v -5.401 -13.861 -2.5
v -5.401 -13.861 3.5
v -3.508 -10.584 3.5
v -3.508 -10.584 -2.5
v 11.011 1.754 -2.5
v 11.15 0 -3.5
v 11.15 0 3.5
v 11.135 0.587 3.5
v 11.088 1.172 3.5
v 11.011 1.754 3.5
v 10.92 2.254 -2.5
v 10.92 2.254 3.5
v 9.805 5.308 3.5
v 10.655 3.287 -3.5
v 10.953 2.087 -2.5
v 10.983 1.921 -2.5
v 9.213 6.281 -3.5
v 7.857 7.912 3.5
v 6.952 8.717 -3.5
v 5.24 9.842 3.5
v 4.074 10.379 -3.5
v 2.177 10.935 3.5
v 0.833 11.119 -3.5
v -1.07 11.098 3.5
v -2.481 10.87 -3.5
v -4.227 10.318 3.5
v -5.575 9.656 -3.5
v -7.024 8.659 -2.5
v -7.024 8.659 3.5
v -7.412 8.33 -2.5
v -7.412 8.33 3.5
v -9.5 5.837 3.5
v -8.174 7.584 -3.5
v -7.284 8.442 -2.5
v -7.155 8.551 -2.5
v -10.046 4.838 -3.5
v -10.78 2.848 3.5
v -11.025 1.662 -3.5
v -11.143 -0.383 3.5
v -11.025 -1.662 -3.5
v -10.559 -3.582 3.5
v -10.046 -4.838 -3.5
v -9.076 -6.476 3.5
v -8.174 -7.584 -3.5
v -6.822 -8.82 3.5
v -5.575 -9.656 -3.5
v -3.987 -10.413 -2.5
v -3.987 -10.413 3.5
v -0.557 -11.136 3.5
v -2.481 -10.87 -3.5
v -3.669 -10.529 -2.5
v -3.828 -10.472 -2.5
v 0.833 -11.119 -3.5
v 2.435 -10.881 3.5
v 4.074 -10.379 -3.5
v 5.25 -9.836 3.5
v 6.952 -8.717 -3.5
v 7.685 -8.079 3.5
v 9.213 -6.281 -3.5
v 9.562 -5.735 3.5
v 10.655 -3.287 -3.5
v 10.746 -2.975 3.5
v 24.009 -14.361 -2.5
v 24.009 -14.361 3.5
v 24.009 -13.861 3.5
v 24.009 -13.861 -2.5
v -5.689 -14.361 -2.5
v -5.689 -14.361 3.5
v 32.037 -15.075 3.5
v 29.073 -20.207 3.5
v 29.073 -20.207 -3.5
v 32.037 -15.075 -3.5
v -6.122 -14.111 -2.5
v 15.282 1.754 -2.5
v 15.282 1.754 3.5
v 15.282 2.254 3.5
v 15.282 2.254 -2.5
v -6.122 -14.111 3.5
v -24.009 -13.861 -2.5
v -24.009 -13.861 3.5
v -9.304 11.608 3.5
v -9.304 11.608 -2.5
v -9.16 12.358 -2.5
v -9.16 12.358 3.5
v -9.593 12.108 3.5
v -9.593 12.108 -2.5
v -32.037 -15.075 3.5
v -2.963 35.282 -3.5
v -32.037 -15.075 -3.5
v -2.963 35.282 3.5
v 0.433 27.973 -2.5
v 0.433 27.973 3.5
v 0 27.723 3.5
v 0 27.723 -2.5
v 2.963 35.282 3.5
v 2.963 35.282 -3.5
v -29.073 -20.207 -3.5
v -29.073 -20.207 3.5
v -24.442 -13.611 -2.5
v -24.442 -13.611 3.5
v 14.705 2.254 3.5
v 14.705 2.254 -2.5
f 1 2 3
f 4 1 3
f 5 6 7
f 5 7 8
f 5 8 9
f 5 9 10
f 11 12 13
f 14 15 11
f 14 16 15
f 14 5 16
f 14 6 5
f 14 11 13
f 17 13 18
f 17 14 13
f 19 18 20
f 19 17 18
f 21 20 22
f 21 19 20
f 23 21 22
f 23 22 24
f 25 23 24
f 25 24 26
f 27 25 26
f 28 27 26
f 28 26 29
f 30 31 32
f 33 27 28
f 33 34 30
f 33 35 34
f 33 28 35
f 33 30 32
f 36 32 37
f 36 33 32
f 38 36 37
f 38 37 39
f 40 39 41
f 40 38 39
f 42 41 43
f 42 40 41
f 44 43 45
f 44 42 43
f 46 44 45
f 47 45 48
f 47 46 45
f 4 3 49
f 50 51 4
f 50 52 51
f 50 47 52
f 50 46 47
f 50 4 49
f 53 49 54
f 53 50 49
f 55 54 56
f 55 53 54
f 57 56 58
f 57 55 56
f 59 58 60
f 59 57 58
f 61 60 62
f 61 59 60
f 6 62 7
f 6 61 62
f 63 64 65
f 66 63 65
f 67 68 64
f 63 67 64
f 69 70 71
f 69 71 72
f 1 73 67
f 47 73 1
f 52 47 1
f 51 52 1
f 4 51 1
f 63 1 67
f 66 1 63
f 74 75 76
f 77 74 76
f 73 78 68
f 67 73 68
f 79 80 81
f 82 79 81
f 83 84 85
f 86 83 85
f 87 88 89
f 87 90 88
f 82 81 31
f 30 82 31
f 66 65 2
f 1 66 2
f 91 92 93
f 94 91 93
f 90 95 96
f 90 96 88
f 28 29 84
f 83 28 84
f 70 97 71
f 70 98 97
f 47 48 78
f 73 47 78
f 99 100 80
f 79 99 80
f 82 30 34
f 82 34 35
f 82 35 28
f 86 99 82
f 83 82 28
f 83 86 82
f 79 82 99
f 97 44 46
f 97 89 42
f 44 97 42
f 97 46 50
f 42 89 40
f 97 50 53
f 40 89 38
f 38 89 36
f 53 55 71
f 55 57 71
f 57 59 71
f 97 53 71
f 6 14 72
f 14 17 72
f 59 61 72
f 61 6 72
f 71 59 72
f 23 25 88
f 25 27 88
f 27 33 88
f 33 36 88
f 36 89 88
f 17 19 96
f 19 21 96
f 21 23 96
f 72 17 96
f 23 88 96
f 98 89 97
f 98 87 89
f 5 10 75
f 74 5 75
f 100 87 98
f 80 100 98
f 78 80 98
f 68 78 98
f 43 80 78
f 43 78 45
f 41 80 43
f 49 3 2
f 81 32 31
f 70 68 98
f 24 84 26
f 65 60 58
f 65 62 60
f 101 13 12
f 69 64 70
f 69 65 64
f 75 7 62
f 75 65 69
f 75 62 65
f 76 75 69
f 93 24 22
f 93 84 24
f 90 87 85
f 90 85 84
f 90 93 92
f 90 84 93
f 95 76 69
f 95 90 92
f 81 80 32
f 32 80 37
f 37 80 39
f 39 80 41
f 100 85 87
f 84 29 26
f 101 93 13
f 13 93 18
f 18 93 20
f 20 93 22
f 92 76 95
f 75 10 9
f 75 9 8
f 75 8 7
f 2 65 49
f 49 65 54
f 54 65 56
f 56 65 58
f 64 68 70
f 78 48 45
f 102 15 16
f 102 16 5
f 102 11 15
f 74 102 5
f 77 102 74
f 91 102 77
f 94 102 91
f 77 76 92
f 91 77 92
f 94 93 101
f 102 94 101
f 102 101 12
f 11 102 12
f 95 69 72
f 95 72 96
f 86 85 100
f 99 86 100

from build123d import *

# Parameters (mm, degrees)
F0_R     = 11.15
F1_DEPTH = 3.5
F3_DEPTH = 6


with BuildPart() as f1:
    # F0 (on Top) → F1 (new body, symmetric)
    with BuildSketch(Plane.XY):
        Polygon((-29.073366, -20.207259), (29.073366, -20.207259), (32.036683, -15.074644), (2.963317, 35.281903), (-2.963317, 35.281903), (-32.036683, -15.074644), align=None)
        Circle(F0_R, mode=Mode.SUBTRACT)
    extrude(amount=F1_DEPTH, both=True)

    # F2 (on face) → F3 (cut)
    with BuildSketch(Plane.XY.offset(3.5)):
        Polygon((14.704705, 2.253575), (10.919886, 2.253575), (10.919886, 1.753575), (15.282055, 1.753575), (15.282055, 2.253575), align=None)
        Polygon((0, 27.722871), (14.704705, 2.253575), (15.282055, 2.253575), (0.433013, 27.972871), align=None)
        Polygon((-9.304005, 11.607861), (-9.592681, 12.107861), (-24.441723, -13.611435), (-24.00871, -13.861435), align=None)
        Polygon((-9.159668, 12.357861), (-9.592681, 12.107861), (-9.304005, 11.607861), (-7.411596, 8.330111), (-6.978583, 8.580111), align=None)
        Polygon((-5.4007, -13.861435), (-5.689375, -14.361435), (24.00871, -14.361435), (24.00871, -13.861435), align=None)
        Polygon((-6.122387, -14.111435), (-5.689375, -14.361435), (-5.4007, -13.861435), (-3.50829, -10.583686), (-3.941303, -10.333686), align=None)
    extrude(amount=-F3_DEPTH, mode=Mode.SUBTRACT)


solid = f1.part
